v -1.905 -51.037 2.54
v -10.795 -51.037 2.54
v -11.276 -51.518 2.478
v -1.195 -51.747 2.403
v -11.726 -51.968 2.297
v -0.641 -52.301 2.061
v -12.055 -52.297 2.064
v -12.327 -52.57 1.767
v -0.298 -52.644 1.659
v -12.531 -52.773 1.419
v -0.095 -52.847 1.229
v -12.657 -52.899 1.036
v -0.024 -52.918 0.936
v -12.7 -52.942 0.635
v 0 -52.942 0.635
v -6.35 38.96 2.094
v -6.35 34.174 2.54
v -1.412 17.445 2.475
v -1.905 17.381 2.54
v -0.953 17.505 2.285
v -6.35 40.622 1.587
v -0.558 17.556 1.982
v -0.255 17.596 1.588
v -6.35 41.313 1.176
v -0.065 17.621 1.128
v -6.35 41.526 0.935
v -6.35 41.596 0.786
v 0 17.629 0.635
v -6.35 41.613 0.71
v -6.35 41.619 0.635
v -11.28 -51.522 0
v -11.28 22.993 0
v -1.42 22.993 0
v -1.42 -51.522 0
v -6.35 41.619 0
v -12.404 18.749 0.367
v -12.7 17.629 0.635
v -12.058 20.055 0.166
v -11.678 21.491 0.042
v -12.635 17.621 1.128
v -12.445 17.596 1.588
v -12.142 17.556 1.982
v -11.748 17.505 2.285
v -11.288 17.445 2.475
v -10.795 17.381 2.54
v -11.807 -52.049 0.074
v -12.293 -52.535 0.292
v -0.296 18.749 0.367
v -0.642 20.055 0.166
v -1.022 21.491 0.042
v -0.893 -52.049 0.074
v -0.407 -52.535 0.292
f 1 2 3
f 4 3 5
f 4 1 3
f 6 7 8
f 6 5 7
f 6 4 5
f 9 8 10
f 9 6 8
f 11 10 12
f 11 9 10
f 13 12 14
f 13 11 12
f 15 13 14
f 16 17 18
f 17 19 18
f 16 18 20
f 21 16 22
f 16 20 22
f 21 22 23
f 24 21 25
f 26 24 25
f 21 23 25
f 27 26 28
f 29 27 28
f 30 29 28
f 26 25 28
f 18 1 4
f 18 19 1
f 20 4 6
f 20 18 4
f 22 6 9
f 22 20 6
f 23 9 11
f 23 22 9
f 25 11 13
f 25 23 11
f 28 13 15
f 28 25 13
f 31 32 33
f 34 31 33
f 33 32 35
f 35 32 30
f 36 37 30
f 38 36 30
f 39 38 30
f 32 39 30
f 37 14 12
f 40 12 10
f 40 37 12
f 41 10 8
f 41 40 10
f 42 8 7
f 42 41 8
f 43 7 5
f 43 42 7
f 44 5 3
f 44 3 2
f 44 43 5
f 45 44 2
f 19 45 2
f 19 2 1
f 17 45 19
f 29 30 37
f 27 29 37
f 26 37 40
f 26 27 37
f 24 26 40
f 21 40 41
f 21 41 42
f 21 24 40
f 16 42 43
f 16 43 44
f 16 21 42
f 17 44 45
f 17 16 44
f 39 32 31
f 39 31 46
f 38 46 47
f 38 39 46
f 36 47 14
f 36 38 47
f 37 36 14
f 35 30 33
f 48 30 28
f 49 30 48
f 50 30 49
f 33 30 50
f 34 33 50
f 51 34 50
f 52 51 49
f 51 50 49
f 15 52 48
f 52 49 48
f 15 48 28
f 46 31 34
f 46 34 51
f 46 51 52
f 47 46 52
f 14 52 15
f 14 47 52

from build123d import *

# Parameters (mm, degrees)
F0_W        = 12.7
F0_H        = 94.5614505536
F1_DEPTH    = 2.54
F3_DEPTH    = 3.81
F4_R        = 1.905
F5_T1_DEPTH = 19.7995158286
F5_T3_DEPTH = 80.155505846


# Not quite as in the source:
# - a fillet or chamfer that OpenCascade refuses, or shapes differently, is made with other operations: its cross-section is extruded or revolved along the edge and cut away or added


with BuildPart() as f1:
    # F0 (on Top) → F1 (new body)
    with BuildSketch(Plane.XY):
        with Locations((-6.35, -5.6614459495)):
            Rectangle(F0_W, F0_H)
    extrude(amount=F1_DEPTH)

    # F2 (on face) → F3 (cut)
    with BuildSketch(Plane.XY.offset(2.54)):
        Polygon((-12.7, 17.6289882511), (-6.35, 41.6192793273), (-12.7, 41.6192793273), align=None)
        Polygon((0, 41.6192793273), (-6.35, 41.6192793273), (0, 17.6289882511), align=None)
    extrude(amount=-F3_DEPTH, mode=Mode.SUBTRACT)

    # F4
    f4_edges = [f1.edges().sort_by_distance(p)[0] for p in [
        (-3.175, 29.624134, 2.54),
        (-12.7, -17.656591, 2.54),
        (0, -17.656591, 2.54),
        (-6.35, -52.942171, 2.54),
        (-9.525, 29.624134, 2.54),
    ]]
    fillet(f4_edges, radius=F4_R)

    # F5: fillet of radius 1.905 on 3 edges, made by hand

    # F5_s2 → F5_t1 (cut)
    with BuildSketch(Plane.YZ.offset(-16.2497579143)):
        with BuildLine():
            ThreePointArc((-51.5222680606, 0), (-52.299981054, 0.1659808799), (-52.9421712264, 0.635))
            Line((-52.9421712264, 0.635), (-52.9421712264, 0))
            Line((-52.9421712264, 0), (-51.5222680606, 0))
        make_face()
    extrude(amount=F5_T1_DEPTH, mode=Mode.SUBTRACT)

    # F5_s4 → F5_t3 (cut)
    with BuildSketch(Plane.XZ.offset(-23.6635767054)):
        with BuildLine():
            ThreePointArc((-11.2800968343, 0), (-12.0578098276, 0.1659808799), (-12.7, 0.635))
            Line((-12.7, 0.635), (-12.7, 0))
            Line((-12.7, 0), (-11.2800968343, 0))
        make_face()
        with BuildLine():
            ThreePointArc((-1.4199031657, 0), (-0.6421901724, 0.1659808799), (0, 0.635))
            Line((0, 0.635), (0, 0))
            Line((0, 0), (-1.4199031657, 0))
        make_face()
    extrude(amount=F5_T3_DEPTH, mode=Mode.SUBTRACT)


solid = f1.part
